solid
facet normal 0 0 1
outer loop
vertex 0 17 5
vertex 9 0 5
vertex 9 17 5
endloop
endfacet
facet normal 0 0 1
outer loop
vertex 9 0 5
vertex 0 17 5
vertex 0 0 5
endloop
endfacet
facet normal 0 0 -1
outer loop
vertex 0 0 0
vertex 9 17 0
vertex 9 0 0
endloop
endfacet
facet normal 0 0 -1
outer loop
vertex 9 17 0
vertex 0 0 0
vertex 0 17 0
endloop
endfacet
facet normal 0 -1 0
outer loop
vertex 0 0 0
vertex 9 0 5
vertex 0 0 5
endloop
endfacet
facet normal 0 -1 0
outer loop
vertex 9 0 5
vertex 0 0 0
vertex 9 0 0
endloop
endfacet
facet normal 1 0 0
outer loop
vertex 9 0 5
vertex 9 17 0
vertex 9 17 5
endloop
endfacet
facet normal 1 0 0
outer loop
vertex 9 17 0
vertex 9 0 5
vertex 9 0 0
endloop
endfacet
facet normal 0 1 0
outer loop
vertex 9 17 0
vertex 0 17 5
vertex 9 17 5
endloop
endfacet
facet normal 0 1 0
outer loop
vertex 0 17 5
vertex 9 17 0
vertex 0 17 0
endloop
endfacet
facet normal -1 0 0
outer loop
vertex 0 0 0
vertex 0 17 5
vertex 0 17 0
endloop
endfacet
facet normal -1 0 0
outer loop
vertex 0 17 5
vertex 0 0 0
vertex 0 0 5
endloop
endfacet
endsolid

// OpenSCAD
// Generated by SolidPython 1.0.1 on 2020-07-29 00:46:55


cube(size = [9, 17, 5]);
/***********************************************
*********      SolidPython code:      **********
************************************************
 
# import packages: SolidPython
from solid import *
from solid.utils import *
from itertools import chain, combinations, permutations


class Resize:

    def __init__(self, scad_file):
        self.scad_file = scad_file
        #self.scad_file = import_scad(scad_file)
        # cone/cylinder param:
        self.r1 = 0
        self.r2 = 0
        self.h = 0
        # rectangular prism param:
        self.w = 0
        self.l = 0
        # ellipse param:
        self.r = 0

    # import OpenScad code (file name corresponds to shape)


    # classify shape + parameters
    def assign(self, param1, param2, param3):
        if self.scad_file == 'cone.scad':
            self.r1 = param1
            self.r2 = param2
            self.h = param3
        elif self.scad_file == 'cylinder.scad':
            self.r1 = param1
            self.r2 = param2
            self.h = param3
        elif self.scad_file == 'rectangularPrism.scad':
            self.h = param1
            self.l = param2
            self.w = param3
        else:
            self.r = param1
            self.h = param2

    # resize parameters
    def iterate(self):
        x = range(3, 20, 2)
        i = 1
        if self.scad_file == 'cone.scad':
            tempList = list(permutations(x, 2))
            for temp in tempList:
                param1 = temp[0]
                param2 = temp[1]
                filepath = 'produced_scad_files/' + 'cone' + str(param1) + '_' + str(param2) + '_' + '.scad'
                scad_render_to_file(cylinder(h=param1, r1=param2, r2=0), filepath)

        elif self.scad_file == 'cylinder.scad':
            tempList = list(permutations(x, 3))
            for temp in tempList:
                param1 = temp[0]
                param2 = temp[1]
                filepath = 'produced_scad_files/' + 'cylinder' + str(param1) + '_' + str(param2) + '_' + '.scad'
                scad_render_to_file(cylinder(h=param1, r1=param2, r2=param2), filepath)

        elif self.scad_file == 'rectangularPrism.scad':
            tempList = list(permutations(x, 3))
            for temp in tempList:
                param1 = temp[0]
                param2 = temp[1]
                param3 = temp[2]
                filepath = 'produced_scad_files/' + 'rectangularPrism' + str(param1) + '_' + str(param2) + '_' + str(
                    param3) + '.scad'
                scad_render_to_file(cube(size=(param1, param2, param3)), filepath)

        elif self.scad_file == 'ellipse.scad':
            tempList = list(permutations(x, 4))
            for temp in tempList:
                param1 = temp[0]
                param2 = temp[1]
                param3 = temp[2]
                param4 = temp[3]
                filepath = 'produced_scad_files/' + 'ellipse' + str(param1) + '_' + str(param2) + '_' + str(param3) + '_' + str(param4) + '.scad'
                scad_render_to_file(scale([param1, param2, param3])(sphere(r=param4)), filepath)

    def render_to_scadfile(self):
        scad_render_to_file(scad, 'example.scad') 
 
************************************************/
